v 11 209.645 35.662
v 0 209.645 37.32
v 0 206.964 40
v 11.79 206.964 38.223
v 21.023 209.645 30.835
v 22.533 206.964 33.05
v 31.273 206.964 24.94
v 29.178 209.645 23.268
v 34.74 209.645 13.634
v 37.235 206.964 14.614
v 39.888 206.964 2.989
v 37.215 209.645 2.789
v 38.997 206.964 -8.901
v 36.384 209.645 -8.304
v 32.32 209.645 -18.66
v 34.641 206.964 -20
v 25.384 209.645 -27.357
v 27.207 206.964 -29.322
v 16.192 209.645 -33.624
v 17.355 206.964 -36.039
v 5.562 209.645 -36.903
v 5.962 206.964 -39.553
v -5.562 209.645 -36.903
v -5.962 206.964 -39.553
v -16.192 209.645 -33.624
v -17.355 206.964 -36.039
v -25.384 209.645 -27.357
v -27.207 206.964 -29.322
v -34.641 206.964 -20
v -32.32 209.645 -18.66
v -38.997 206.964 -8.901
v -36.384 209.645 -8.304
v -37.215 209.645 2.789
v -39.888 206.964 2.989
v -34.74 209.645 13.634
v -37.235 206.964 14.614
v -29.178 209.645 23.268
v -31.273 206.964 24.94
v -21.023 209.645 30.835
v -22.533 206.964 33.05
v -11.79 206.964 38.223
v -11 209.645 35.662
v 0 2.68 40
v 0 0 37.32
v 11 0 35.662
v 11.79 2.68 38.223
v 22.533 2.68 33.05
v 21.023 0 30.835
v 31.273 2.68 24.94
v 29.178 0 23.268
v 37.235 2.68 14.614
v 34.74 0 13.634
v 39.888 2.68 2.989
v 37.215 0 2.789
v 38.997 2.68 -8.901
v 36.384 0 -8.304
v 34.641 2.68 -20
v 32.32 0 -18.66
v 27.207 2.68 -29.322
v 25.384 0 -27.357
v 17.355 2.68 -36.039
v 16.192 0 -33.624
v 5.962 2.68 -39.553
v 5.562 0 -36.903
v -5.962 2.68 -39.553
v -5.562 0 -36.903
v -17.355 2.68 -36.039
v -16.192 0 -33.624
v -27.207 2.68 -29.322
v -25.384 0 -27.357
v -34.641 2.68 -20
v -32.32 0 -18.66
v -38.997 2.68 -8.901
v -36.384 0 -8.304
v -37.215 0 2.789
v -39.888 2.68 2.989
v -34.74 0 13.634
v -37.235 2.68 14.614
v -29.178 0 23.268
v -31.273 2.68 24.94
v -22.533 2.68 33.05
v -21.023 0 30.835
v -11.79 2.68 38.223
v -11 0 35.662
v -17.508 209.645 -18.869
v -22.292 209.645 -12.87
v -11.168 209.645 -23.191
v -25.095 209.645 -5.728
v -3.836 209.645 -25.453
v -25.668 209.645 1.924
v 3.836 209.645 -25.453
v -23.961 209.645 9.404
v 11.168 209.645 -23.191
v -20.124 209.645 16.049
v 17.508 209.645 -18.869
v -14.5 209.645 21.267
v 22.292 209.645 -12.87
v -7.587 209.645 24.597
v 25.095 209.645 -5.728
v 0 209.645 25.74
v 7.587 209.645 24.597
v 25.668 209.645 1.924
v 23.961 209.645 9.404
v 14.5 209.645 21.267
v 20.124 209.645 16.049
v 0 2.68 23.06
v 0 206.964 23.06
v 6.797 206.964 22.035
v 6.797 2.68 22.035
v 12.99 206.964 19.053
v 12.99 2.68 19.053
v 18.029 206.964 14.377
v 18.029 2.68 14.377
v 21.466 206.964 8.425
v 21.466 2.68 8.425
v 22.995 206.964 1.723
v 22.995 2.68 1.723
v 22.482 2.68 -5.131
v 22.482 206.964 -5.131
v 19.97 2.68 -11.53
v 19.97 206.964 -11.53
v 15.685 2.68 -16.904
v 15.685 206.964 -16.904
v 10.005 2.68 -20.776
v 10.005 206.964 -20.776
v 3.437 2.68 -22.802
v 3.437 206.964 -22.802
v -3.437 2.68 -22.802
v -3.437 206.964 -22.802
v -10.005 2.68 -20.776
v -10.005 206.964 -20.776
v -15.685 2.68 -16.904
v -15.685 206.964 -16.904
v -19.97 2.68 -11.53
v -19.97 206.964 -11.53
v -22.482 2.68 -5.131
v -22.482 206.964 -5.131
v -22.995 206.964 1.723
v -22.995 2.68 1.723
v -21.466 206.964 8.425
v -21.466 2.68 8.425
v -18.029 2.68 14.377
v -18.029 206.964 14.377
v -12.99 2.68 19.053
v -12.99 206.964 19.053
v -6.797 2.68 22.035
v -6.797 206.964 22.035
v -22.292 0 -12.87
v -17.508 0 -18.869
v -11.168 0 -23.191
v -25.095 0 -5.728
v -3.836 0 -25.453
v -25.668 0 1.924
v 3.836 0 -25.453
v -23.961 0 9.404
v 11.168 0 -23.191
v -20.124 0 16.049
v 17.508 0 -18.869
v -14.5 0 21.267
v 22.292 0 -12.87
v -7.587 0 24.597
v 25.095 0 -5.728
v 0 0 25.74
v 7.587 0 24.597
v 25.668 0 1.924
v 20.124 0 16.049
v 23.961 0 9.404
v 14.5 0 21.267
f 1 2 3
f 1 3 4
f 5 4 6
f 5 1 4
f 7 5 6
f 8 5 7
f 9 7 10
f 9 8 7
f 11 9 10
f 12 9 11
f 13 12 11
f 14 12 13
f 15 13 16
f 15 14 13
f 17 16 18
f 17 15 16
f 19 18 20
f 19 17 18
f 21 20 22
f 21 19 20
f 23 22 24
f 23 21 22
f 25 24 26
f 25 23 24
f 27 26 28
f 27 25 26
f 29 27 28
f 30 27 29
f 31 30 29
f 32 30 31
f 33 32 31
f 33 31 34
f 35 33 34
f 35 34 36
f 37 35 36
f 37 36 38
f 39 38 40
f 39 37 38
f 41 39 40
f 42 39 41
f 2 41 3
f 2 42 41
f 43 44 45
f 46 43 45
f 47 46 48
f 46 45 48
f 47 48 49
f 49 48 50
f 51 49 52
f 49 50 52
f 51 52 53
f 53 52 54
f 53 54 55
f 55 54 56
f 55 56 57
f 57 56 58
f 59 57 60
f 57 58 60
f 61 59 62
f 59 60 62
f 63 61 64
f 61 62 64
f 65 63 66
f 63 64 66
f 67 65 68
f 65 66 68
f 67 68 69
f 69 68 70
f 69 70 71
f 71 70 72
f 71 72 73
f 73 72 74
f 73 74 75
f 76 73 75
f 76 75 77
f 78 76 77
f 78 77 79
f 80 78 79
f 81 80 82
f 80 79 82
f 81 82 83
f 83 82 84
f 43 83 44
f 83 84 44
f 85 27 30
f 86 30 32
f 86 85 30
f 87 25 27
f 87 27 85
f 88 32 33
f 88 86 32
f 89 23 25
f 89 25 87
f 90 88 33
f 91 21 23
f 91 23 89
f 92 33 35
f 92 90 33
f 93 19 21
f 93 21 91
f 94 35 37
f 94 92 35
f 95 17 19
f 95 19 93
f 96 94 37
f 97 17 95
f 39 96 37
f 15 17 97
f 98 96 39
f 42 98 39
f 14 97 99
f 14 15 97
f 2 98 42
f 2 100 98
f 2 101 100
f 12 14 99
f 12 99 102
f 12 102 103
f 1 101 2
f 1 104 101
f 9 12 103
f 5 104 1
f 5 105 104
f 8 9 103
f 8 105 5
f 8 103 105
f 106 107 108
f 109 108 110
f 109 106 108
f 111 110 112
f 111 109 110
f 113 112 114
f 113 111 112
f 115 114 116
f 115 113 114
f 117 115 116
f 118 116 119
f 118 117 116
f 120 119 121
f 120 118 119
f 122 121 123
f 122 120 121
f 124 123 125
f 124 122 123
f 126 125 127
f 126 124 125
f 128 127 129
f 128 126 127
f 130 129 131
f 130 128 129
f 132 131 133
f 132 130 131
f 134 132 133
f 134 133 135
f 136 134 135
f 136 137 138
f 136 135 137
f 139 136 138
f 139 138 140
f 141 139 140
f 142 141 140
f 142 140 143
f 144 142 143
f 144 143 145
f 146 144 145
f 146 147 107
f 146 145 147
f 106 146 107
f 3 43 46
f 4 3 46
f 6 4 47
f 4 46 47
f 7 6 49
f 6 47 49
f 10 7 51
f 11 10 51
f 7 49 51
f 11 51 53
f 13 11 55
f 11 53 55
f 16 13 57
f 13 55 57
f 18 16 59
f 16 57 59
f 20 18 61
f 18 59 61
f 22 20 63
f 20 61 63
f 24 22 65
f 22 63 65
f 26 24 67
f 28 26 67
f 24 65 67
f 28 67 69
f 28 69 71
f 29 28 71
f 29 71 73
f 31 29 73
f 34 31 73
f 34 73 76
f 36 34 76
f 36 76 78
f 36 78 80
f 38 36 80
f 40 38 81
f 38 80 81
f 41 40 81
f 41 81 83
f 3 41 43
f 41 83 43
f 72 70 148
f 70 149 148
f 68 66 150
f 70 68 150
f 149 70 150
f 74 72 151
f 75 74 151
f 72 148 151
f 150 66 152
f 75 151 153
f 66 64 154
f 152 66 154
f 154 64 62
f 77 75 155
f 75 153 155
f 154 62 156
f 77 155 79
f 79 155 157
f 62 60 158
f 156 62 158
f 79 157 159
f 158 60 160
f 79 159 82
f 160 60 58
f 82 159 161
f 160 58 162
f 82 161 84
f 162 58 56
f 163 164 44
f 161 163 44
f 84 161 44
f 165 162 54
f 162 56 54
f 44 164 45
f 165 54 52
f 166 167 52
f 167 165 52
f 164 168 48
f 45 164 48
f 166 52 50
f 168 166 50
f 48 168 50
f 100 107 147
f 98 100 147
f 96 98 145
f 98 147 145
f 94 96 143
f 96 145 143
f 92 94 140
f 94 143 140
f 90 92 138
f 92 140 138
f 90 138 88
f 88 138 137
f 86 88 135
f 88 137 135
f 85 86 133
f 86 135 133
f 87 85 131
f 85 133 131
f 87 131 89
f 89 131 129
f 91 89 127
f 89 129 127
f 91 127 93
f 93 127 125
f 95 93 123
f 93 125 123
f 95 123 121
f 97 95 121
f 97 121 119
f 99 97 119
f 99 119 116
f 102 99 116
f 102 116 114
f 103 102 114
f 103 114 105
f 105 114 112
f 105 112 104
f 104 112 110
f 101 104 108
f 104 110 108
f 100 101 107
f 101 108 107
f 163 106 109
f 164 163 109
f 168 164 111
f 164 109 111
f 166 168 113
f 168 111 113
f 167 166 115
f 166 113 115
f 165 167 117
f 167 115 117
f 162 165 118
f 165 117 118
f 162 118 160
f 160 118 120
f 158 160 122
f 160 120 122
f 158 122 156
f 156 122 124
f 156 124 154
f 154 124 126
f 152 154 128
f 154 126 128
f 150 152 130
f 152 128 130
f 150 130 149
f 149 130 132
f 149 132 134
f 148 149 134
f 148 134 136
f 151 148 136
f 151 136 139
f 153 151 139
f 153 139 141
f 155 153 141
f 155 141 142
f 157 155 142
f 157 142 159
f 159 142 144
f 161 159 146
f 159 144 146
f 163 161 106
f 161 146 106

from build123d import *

# Parameters (mm, degrees)
SKETCH1_R           = 40
BOSS_EXTRUDE1_DEPTH = 209.644705536
SKETCH2_R           = 23.059697106
CUT_EXTRUDE1_DEPTH  = 218.14258578
CHAMFER1_SIZE       = 2.680415069


with BuildPart() as part:
    # Sketch1 → Boss-Extrude1 (new body)
    with BuildSketch(Plane(origin=(0, 0, 0), x_dir=(1, 0, 0), z_dir=(0, 1, 0))):
        Circle(SKETCH1_R)
    extrude(amount=BOSS_EXTRUDE1_DEPTH)

    # Sketch2 → Cut-Extrude1 (cut, through all)
    with BuildSketch(Plane(origin=(0, 0, 0), x_dir=(1, 0, 0), z_dir=(0, 1, 0))):
        Circle(SKETCH2_R)
    extrude(amount=CUT_EXTRUDE1_DEPTH, mode=Mode.SUBTRACT)

    # Chamfer1
    chamfer1_edges = [part.edges().sort_by_distance(p)[0] for p in [
        (-23.059697106, 209.644705536, 0),
        (-23.059697106, 0, 0),
        (-40, 0, 0),
        (-40, 209.644705536, 0),
    ]]
    chamfer(chamfer1_edges, length=CHAMFER1_SIZE)


solid = part.part
